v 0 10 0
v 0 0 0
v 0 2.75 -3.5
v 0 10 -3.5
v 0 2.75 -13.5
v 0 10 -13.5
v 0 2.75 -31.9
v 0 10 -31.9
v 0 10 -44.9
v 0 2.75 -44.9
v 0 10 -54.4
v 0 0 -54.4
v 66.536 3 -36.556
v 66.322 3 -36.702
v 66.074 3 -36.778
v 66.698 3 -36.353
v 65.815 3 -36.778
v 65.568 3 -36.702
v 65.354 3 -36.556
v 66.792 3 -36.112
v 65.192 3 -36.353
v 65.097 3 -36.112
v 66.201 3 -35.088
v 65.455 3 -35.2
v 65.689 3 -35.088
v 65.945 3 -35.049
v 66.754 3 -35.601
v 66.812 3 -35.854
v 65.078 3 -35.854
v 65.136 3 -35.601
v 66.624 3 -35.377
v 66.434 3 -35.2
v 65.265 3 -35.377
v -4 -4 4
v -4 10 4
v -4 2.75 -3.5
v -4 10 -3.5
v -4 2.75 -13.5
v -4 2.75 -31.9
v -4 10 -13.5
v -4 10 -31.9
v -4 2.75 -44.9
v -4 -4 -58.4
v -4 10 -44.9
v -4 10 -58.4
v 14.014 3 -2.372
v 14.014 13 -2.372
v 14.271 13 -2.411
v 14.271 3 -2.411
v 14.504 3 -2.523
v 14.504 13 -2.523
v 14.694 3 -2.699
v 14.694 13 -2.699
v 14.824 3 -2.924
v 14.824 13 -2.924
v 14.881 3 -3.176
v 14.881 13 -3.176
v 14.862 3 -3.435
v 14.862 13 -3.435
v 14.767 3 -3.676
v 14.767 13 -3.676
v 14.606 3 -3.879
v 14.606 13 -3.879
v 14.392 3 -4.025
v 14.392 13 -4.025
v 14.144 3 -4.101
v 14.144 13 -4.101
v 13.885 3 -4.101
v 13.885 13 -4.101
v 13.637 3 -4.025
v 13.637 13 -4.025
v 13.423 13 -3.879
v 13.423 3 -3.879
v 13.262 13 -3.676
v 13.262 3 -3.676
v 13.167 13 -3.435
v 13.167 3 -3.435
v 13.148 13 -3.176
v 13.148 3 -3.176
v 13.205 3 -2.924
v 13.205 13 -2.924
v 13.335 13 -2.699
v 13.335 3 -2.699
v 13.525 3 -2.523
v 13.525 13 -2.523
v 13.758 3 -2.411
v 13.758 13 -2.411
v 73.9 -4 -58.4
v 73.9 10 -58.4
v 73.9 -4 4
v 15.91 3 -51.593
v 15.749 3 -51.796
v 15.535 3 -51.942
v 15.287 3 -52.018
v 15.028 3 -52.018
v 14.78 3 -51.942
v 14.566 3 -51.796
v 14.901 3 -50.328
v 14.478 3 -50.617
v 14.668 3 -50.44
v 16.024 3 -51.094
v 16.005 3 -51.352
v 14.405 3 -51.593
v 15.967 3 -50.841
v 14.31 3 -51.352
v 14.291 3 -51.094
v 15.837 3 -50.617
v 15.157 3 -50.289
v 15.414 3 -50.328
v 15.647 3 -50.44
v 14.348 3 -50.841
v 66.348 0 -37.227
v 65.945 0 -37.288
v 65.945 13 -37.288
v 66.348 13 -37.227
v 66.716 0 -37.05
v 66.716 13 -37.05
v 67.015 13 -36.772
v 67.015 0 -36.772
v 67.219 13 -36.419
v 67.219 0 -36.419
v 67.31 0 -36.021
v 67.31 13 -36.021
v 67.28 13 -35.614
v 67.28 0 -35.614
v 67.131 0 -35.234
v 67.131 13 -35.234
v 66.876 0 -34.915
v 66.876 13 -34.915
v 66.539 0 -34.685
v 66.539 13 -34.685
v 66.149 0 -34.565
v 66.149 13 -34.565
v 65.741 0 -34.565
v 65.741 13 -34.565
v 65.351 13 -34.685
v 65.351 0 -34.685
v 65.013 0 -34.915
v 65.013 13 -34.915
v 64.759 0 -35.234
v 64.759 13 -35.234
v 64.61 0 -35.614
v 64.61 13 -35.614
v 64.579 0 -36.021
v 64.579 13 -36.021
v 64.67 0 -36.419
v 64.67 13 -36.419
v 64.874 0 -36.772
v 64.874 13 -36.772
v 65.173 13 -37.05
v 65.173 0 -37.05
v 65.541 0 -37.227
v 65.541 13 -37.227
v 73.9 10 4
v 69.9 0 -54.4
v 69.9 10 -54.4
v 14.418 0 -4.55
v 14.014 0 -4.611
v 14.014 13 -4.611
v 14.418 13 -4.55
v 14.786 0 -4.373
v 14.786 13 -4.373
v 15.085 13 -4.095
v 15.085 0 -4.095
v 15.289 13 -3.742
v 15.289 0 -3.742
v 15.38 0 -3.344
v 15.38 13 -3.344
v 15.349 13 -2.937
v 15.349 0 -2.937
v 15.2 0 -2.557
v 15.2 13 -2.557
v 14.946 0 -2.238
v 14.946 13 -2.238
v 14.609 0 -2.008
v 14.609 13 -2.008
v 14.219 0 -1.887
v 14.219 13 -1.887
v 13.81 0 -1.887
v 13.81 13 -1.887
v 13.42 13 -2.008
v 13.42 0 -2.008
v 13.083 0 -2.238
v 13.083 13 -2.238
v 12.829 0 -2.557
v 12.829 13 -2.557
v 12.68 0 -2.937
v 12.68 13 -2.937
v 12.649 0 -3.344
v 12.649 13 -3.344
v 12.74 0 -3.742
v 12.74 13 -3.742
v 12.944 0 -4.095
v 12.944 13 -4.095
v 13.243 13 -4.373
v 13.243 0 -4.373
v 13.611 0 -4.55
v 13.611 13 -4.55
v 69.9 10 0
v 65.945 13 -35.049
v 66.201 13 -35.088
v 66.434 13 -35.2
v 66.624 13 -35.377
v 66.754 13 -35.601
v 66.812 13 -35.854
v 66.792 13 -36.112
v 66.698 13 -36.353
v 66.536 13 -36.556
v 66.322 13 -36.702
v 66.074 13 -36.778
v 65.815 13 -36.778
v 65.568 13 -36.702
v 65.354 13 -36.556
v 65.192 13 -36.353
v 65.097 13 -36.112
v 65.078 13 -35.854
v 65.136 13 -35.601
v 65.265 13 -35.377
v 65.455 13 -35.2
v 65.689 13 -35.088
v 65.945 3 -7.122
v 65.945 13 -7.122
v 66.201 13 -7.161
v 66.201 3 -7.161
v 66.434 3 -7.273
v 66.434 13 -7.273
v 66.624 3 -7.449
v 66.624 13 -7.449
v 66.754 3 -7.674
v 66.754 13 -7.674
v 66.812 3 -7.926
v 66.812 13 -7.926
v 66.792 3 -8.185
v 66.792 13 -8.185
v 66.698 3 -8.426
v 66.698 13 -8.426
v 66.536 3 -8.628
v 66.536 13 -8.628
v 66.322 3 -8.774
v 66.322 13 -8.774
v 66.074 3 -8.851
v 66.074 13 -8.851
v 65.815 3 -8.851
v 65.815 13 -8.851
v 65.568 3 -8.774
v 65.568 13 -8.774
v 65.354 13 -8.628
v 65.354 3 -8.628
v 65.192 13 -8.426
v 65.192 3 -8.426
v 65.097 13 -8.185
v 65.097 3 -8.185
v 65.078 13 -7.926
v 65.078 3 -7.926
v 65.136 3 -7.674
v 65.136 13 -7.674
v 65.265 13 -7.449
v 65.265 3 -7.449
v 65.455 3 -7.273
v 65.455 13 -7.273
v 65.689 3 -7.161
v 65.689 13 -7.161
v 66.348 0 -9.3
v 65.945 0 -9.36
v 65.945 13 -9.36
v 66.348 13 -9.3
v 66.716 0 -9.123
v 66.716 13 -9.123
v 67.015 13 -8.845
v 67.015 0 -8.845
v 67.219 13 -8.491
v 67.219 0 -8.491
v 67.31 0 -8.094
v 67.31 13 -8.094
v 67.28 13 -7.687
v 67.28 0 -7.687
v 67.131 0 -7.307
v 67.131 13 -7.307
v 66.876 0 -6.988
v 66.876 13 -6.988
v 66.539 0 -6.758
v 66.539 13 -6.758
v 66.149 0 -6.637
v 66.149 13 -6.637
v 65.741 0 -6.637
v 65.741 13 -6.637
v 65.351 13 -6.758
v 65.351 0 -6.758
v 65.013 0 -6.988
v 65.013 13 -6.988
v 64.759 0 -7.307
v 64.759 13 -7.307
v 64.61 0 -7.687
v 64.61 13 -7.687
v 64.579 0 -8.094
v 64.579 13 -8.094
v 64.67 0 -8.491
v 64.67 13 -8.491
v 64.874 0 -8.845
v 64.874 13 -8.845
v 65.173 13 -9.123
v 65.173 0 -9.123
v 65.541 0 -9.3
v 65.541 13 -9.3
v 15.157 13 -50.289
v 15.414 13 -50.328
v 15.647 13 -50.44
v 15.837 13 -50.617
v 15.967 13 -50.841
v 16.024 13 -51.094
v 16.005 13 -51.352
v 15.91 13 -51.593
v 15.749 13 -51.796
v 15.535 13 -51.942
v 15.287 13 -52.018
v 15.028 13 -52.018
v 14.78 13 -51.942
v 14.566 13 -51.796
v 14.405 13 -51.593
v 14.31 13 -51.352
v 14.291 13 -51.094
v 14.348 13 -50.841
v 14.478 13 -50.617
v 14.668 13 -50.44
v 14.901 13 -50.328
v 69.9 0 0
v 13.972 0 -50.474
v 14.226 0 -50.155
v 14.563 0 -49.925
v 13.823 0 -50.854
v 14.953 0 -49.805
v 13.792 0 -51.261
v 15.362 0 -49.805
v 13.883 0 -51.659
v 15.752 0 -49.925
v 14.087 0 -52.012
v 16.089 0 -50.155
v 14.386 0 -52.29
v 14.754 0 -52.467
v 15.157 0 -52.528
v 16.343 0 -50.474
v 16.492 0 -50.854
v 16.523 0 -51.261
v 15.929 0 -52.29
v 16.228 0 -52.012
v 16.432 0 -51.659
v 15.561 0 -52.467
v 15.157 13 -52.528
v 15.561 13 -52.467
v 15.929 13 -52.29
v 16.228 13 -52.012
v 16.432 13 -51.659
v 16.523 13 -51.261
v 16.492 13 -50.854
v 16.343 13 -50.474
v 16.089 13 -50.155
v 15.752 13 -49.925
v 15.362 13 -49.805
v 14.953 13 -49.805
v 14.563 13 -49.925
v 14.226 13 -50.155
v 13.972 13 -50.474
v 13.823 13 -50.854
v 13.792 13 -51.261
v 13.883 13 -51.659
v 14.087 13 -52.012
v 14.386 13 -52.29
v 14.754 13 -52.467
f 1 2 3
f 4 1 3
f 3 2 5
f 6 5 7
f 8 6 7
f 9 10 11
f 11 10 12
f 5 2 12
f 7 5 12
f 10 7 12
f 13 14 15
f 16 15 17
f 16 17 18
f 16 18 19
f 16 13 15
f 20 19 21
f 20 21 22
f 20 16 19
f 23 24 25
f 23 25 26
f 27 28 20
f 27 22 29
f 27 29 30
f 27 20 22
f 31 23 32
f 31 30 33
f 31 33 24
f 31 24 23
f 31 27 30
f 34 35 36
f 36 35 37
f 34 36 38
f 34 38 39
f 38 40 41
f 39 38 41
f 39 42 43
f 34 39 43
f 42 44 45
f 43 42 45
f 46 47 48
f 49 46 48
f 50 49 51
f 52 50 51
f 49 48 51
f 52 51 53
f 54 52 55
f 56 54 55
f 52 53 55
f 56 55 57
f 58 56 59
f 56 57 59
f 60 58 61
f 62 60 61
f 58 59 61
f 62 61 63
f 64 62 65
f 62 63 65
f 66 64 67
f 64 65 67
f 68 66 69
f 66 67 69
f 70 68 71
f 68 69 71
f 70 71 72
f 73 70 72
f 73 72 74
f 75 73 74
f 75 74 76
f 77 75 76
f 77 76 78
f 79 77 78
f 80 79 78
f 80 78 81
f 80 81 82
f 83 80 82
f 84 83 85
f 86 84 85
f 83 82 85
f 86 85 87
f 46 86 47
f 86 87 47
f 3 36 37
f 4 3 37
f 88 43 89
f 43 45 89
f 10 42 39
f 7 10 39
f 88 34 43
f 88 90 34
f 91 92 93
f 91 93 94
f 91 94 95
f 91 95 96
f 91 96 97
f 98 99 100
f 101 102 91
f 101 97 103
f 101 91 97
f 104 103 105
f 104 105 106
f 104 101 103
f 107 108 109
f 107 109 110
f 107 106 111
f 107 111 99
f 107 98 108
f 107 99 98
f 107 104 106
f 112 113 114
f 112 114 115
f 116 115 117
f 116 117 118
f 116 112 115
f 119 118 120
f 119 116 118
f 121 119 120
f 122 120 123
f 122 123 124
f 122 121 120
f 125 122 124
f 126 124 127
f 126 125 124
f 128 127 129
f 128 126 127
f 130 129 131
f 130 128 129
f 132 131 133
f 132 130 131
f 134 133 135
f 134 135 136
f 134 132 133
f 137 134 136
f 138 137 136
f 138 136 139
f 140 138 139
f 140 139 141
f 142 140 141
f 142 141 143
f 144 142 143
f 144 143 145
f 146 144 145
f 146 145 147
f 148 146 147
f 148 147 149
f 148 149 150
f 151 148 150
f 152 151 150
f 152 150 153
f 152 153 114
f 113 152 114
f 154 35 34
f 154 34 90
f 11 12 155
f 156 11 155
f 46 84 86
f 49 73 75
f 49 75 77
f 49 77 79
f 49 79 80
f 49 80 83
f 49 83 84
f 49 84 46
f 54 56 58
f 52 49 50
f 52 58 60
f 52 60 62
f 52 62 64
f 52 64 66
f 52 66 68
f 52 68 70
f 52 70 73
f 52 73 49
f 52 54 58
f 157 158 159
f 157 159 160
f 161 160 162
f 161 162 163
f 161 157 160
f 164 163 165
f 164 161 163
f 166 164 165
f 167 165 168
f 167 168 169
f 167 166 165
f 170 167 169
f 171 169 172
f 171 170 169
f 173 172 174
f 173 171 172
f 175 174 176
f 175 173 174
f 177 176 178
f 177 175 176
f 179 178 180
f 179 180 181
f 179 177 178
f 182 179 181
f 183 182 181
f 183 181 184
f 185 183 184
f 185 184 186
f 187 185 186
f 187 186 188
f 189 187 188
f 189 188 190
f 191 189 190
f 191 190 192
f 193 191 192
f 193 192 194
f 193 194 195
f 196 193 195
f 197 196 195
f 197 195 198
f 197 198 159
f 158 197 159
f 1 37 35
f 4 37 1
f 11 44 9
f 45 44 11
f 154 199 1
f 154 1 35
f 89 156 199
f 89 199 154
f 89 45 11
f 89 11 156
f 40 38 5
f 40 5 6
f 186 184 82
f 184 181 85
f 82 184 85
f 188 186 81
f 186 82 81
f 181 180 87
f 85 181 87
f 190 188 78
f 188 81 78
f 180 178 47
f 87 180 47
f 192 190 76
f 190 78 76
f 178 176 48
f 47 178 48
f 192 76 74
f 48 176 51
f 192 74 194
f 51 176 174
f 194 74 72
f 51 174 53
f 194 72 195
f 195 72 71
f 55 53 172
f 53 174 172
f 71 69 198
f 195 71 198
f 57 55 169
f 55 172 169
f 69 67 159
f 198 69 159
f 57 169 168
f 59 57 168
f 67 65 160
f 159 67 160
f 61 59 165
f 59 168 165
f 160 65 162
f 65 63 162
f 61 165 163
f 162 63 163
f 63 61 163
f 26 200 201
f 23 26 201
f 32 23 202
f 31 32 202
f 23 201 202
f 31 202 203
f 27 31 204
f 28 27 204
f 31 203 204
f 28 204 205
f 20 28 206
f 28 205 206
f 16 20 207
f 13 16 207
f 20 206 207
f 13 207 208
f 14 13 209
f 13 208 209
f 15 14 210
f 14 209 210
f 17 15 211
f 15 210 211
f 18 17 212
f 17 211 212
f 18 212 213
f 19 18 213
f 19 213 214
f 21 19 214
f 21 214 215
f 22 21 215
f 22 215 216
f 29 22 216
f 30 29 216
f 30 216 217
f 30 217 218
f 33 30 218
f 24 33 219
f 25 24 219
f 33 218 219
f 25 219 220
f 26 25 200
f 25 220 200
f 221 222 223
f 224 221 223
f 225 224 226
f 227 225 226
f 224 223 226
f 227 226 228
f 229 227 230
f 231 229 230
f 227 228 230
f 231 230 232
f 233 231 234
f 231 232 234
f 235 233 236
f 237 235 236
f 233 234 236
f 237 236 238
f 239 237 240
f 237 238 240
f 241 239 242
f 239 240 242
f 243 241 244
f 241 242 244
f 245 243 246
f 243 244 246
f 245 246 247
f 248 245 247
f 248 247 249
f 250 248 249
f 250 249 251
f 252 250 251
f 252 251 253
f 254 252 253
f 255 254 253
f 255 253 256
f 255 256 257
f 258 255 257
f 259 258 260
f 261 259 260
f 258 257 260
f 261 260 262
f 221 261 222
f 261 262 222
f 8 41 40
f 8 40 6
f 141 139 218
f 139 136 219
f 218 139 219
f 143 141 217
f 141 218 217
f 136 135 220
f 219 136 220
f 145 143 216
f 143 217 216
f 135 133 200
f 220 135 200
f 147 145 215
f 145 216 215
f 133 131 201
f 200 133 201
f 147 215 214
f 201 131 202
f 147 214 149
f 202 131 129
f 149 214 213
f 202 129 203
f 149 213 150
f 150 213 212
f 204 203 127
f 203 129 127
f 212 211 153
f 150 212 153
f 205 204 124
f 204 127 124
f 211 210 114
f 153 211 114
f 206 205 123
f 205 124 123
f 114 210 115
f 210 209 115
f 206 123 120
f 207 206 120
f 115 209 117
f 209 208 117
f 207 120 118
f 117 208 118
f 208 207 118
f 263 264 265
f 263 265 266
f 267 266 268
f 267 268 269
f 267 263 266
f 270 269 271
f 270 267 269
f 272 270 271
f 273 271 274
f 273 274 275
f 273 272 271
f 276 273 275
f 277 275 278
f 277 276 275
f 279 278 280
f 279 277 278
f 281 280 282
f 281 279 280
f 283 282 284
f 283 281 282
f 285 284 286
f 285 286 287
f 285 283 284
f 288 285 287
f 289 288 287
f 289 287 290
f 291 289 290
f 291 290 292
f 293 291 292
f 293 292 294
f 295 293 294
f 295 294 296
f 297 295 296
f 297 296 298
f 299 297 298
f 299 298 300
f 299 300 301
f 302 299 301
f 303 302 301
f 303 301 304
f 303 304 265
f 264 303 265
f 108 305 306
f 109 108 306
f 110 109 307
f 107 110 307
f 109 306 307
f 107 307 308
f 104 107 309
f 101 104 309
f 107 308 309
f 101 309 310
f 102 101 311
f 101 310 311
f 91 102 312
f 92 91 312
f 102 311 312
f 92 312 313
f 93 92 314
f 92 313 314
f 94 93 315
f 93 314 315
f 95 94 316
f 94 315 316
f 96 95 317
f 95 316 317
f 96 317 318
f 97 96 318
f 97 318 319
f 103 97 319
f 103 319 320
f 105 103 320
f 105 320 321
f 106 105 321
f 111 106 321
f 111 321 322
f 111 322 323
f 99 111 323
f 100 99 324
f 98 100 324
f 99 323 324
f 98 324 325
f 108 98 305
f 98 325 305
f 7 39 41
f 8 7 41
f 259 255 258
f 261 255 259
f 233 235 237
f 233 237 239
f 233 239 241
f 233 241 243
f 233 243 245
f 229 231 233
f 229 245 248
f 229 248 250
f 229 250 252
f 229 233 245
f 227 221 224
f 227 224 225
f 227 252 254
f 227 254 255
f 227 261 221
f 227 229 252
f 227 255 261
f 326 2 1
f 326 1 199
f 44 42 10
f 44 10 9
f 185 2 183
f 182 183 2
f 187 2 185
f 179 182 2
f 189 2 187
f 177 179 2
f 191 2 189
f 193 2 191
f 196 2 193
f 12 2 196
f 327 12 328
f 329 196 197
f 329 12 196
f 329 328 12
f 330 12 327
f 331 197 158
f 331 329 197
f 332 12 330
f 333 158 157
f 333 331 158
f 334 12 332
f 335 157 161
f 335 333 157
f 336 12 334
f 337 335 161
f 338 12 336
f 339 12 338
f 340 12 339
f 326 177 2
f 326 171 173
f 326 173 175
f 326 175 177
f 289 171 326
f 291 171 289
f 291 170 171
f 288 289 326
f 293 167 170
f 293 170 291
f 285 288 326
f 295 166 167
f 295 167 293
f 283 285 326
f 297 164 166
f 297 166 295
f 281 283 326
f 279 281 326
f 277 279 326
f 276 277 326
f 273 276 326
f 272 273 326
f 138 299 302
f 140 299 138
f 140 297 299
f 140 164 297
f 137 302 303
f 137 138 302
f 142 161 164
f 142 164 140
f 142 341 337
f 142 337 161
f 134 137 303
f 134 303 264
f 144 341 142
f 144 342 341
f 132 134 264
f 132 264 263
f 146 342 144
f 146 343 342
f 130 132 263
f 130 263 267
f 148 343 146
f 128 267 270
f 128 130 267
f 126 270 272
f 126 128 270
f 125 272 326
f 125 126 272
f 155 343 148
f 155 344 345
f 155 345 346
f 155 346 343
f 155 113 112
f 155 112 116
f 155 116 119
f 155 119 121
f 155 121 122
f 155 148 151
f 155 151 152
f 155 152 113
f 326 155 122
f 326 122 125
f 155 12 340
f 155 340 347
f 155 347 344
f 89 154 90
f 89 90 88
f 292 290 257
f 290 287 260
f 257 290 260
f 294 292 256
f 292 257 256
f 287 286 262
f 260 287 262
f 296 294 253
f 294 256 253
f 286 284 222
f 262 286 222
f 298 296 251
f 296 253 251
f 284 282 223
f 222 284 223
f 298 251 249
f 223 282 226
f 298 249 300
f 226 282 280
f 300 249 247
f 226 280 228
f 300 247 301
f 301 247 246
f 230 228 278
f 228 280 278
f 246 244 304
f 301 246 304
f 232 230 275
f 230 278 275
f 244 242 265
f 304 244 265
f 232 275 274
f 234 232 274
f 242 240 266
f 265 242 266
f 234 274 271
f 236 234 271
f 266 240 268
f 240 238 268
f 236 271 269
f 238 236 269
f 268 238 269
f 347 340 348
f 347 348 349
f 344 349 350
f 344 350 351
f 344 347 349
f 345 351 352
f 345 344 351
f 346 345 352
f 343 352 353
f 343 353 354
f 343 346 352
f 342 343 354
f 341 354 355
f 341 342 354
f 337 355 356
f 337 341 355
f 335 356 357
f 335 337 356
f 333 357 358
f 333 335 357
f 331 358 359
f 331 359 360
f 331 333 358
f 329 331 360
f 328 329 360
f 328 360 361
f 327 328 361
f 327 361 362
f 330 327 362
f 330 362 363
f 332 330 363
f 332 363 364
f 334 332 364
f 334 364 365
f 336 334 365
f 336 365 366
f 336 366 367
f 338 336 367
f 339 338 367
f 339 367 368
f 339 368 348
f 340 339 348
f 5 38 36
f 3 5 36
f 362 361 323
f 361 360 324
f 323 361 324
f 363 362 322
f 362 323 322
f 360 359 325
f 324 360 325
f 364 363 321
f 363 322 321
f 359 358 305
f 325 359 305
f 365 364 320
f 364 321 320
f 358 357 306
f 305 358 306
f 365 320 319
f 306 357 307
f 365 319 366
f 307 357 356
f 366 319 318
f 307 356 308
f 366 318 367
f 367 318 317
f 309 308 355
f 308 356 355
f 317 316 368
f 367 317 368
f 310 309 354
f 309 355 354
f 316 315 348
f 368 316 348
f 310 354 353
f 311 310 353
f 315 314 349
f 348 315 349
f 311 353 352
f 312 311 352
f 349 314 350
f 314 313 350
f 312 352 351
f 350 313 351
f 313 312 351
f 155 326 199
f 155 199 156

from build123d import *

# Parameters (mm, degrees)
SKETCH1_W           = 77.9
SKETCH1_H           = 62.4
SKETCH1_W_2         = 69.9
SKETCH1_H_2         = 54.4
BOSS_EXTRUDE1_DEPTH = 10
SKETCH2_W           = 77.9
SKETCH2_H           = 62.4
BOSS_EXTRUDE2_DEPTH = 4
CUT_EXTRUDE1_REACH  = 99.872
SKETCH3_W           = 13
SKETCH3_H           = 7.25
CUT_EXTRUDE2_REACH  = 99.872
SKETCH4_W           = 10
SKETCH4_H           = 7.25
SKETCH5_R           = 1.36925
BOSS_EXTRUDE3_DEPTH = 17
SKETCH6_R           = 0.86925
CUT_EXTRUDE3_DEPTH  = 10


with BuildPart() as part:
    # Sketch1 → Boss-Extrude1 (new body)
    with BuildSketch(Plane(origin=(0, 0, 0), x_dir=(1, 0, 0), z_dir=(0, 1, 0))):
        with Locations((34.95, 27.2)):
            Rectangle(SKETCH1_W, SKETCH1_H)
        with Locations((34.95, 27.2)):
            Rectangle(SKETCH1_W_2, SKETCH1_H_2, mode=Mode.SUBTRACT)
    extrude(amount=BOSS_EXTRUDE1_DEPTH)

    # Sketch2 → Boss-Extrude2 (add)
    with BuildSketch(Plane(origin=(0, 0, 0), x_dir=(1, 0, 0), z_dir=(0, 1, 0))):
        with Locations((34.95, 27.2)):
            Rectangle(SKETCH2_W, SKETCH2_H)
    extrude(amount=-BOSS_EXTRUDE2_DEPTH)

    # Sketch3 → Cut-Extrude1 (cut, up to next)
    with BuildSketch(Plane.ZY.offset(4), mode=Mode.PRIVATE) as cut_extrude1_sk1:
        with Locations((-38.4, 6.375)):
            Rectangle(SKETCH3_W, SKETCH3_H)
    cut_extrude1_tool1 = extrude(cut_extrude1_sk1.sketch, amount=-CUT_EXTRUDE1_REACH, mode=Mode.PRIVATE) & part.part
    add(cut_extrude1_tool1.solids().sort_by_distance((-4, 6.375, -38.4))[0], mode=Mode.SUBTRACT)

    # Sketch4 → Cut-Extrude2 (cut, up to next)
    with BuildSketch(Plane.ZY.offset(4), mode=Mode.PRIVATE) as cut_extrude2_sk1:
        with Locations((-8.5, 6.375)):
            Rectangle(SKETCH4_W, SKETCH4_H)
    cut_extrude2_tool1 = extrude(cut_extrude2_sk1.sketch, amount=-CUT_EXTRUDE2_REACH, mode=Mode.PRIVATE) & part.part
    add(cut_extrude2_tool1.solids().sort_by_distance((-4, 6.375, -8.5))[0], mode=Mode.SUBTRACT)

    # Sketch5 → Boss-Extrude3 (add)
    with BuildSketch(Plane(origin=(0, -4, 0), x_dir=(-1, 0, 0), z_dir=(0, -1, 0))):
        with Locations((-65.94475, 7.99125)):
            Circle(SKETCH5_R)
        with Locations((-15.15745, 51.15855)):
            Circle(SKETCH5_R)
        with Locations((-65.94475, 35.91855)):
            Circle(SKETCH5_R)
        with Locations((-14.01445, 3.24145)):
            Circle(SKETCH5_R)
    extrude(amount=-BOSS_EXTRUDE3_DEPTH)

    # Sketch6 → Cut-Extrude3 (cut)
    with BuildSketch(Plane(origin=(0, 13, 0), x_dir=(1, 0, 0), z_dir=(0, 1, 0))):
        with Locations((65.94475, 35.91855)):
            Circle(SKETCH6_R)
        with Locations((65.94475, 7.99125)):
            Circle(SKETCH6_R)
        with Locations((14.01445, 3.24145)):
            Circle(SKETCH6_R)
        with Locations((15.15745, 51.15855)):
            Circle(SKETCH6_R)
    extrude(amount=-CUT_EXTRUDE3_DEPTH, mode=Mode.SUBTRACT)


solid = part.part
